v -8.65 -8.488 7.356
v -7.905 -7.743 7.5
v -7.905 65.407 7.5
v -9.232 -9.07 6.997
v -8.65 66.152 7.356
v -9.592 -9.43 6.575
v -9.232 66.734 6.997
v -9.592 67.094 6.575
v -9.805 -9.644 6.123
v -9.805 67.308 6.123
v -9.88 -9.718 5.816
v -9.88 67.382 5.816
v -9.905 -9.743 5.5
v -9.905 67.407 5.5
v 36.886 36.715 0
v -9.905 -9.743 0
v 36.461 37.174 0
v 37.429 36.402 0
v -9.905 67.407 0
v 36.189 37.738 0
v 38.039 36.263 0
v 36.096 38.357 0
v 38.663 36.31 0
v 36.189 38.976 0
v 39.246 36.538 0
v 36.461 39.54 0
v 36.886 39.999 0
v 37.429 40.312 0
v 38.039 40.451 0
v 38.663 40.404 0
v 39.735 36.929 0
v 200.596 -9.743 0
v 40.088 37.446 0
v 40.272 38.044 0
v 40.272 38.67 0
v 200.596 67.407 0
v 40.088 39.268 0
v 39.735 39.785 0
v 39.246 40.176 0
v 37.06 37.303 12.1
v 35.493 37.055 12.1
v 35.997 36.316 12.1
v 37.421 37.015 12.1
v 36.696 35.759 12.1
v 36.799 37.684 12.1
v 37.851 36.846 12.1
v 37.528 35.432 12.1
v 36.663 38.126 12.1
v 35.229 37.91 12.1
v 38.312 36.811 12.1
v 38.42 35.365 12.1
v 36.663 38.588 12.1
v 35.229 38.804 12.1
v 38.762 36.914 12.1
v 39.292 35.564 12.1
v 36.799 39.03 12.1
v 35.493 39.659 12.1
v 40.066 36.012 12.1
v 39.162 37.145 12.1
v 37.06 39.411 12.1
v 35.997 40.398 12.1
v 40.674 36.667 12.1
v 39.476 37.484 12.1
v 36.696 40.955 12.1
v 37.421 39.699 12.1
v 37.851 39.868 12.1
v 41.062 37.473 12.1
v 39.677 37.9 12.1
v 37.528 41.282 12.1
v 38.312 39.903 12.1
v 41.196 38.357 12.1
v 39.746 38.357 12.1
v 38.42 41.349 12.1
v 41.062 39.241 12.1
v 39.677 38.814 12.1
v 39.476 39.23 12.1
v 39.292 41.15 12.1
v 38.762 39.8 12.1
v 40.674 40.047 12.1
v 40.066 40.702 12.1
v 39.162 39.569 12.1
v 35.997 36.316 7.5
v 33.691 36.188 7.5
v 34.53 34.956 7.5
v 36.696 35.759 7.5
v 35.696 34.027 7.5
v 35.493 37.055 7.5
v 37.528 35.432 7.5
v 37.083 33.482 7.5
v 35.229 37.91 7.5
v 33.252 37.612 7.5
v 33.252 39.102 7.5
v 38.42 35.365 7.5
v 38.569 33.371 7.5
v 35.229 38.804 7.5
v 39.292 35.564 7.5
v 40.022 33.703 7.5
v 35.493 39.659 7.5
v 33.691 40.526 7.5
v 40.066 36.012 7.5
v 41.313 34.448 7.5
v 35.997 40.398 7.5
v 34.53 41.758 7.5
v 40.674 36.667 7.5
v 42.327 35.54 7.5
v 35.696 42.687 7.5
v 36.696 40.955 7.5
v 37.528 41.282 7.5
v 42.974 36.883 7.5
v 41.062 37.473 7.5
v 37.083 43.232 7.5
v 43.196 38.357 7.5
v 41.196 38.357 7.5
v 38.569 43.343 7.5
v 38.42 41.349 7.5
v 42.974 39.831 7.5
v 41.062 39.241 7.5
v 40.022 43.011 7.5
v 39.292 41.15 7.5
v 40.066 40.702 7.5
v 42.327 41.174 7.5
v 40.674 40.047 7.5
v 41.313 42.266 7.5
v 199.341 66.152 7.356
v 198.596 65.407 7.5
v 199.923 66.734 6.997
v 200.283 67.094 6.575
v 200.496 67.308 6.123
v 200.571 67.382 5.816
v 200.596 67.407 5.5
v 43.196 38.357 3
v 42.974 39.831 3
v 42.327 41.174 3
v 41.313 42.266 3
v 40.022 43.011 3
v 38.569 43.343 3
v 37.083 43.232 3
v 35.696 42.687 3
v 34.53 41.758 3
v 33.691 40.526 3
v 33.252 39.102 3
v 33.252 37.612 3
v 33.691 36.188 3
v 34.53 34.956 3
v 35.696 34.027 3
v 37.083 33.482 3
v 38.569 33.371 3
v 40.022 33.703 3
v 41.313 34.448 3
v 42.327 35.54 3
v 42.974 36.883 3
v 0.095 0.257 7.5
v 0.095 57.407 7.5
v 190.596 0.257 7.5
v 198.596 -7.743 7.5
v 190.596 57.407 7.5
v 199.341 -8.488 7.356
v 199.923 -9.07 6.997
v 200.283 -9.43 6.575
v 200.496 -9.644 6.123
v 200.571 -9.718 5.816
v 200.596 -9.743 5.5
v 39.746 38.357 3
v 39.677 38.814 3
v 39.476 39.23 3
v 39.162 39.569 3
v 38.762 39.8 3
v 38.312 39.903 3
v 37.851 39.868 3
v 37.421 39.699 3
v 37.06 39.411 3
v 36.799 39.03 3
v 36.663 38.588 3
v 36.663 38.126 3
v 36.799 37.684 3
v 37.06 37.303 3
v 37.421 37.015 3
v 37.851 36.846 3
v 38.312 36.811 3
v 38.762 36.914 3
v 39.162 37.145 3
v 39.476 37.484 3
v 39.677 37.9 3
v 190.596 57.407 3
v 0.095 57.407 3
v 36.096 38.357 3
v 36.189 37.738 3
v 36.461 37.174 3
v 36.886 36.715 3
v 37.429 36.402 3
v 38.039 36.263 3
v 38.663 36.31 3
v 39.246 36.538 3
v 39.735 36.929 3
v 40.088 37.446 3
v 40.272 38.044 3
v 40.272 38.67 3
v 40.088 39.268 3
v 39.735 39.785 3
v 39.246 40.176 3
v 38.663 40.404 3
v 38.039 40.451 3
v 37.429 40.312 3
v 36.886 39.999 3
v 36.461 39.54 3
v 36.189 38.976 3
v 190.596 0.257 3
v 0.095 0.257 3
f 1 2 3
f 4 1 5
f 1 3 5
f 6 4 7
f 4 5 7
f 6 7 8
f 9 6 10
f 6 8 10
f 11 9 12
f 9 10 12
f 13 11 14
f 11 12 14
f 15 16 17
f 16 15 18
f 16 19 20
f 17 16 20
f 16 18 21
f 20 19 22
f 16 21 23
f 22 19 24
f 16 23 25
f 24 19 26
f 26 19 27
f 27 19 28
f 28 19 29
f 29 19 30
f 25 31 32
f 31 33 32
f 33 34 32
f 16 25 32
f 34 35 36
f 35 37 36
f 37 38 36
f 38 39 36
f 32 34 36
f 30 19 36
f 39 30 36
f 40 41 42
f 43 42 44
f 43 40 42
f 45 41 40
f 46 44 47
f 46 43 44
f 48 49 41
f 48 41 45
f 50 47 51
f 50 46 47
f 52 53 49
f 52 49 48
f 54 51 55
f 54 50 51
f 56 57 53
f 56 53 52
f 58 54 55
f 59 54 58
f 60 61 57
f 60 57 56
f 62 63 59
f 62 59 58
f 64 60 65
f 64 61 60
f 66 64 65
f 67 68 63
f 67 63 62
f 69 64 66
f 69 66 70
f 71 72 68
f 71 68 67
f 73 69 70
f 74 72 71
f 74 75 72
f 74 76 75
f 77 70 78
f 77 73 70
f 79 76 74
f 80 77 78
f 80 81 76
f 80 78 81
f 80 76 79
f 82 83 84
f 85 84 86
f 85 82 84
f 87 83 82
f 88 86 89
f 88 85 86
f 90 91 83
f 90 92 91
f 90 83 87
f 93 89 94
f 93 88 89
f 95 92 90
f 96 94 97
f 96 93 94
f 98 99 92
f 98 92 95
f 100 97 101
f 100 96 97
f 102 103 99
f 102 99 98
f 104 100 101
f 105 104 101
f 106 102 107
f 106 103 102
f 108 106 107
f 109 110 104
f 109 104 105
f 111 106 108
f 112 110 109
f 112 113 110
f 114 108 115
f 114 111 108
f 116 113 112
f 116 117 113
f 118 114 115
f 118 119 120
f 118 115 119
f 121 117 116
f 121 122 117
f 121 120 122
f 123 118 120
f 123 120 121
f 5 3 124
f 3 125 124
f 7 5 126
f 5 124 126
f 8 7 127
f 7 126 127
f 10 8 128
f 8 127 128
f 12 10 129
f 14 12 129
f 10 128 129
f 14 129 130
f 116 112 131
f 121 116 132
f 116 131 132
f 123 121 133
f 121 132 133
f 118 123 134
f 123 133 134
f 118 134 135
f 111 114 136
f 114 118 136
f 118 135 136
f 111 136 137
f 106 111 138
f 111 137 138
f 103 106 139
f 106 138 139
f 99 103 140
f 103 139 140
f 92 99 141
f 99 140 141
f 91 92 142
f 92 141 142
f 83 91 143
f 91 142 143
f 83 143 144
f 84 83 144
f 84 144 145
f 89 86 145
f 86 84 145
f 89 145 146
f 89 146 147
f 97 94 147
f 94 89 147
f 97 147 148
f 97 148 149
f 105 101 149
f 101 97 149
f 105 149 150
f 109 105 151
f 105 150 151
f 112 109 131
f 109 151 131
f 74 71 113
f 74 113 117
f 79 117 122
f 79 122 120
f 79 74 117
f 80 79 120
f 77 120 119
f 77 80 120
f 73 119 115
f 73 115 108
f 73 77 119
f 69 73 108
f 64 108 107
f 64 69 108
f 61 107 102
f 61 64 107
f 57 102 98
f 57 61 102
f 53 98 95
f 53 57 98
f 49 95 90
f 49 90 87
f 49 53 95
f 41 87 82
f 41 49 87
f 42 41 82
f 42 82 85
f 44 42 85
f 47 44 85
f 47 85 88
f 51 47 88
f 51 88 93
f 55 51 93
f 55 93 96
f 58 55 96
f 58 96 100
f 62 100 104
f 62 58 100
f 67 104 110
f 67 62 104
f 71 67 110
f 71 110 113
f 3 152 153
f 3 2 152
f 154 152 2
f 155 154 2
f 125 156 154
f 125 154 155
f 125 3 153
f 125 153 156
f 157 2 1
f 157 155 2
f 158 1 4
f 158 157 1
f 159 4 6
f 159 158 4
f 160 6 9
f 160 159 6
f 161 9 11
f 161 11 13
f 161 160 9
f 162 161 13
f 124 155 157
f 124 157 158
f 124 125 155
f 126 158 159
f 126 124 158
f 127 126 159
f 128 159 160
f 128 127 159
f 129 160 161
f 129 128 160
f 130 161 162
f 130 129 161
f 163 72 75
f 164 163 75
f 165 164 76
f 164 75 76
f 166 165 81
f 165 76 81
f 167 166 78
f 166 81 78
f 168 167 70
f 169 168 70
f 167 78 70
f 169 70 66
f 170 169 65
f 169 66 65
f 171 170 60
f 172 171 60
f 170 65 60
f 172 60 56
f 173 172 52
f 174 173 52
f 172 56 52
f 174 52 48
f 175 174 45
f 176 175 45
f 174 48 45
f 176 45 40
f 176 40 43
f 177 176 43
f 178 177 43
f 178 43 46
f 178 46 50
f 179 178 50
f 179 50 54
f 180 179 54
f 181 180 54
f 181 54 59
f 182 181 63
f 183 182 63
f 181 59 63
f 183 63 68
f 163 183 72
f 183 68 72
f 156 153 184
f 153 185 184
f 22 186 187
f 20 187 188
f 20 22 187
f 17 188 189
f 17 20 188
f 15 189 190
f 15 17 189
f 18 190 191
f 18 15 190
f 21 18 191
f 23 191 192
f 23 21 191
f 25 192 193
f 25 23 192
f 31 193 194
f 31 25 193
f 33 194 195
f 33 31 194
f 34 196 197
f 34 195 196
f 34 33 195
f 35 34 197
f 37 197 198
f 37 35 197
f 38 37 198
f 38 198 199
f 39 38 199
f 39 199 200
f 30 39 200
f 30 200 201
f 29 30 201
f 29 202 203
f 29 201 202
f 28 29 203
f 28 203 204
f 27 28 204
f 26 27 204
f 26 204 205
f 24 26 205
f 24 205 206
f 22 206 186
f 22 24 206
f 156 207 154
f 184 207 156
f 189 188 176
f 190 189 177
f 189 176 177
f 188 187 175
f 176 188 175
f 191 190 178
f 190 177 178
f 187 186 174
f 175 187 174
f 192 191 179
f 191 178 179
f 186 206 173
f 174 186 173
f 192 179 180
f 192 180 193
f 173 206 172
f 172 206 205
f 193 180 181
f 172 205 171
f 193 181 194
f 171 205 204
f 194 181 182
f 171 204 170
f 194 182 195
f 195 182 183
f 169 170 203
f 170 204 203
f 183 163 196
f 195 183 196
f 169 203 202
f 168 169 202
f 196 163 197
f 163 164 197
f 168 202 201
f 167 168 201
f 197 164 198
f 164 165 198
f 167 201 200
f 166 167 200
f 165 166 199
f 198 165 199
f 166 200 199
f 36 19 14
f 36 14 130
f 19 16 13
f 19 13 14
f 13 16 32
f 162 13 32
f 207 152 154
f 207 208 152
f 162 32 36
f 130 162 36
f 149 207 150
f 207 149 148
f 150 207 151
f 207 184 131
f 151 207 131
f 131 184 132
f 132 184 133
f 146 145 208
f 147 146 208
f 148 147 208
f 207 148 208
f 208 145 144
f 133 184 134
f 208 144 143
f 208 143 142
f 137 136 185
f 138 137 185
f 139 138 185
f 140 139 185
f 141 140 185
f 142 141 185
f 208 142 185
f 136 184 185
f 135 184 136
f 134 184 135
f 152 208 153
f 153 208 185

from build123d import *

# Parameters (mm, degrees)
SKETCH_2_W                 = 210.5009
SKETCH_2_H                 = 77.1505
EXTRUDE_1_DEPTH            = 34.5
SHELL_1_T                  = -10
SHELL_1_THICKNESS_2_FACE_W = 190.5009
SHELL_1_THICKNESS_2_FACE_H = 57.1505
SHELL_1_THICKNESS_2_DEPTH  = 7
SKETCH_3_R                 = 2.1
CUT_EXTRUDE_8_DEPTH        = 7.6
SKETCH_4_R                 = 5
EXTRUDE_2_DEPTH            = 9.1
SKETCH_6_R                 = 1.55
CUT_EXTRUDE_9_DEPTH        = 9.1
CUT_EXTRUDE_START          = 12.1
SKETCH_10_OUTSIDE_W        = 257.867
SKETCH_10_OUTSIDE_H        = 124.516
SKETCH_10_OUTSIDE_R        = 3
CUT_EXTRUDE_16_DEPTH       = 4.6
FILLET_1_R                 = 2


with BuildPart() as part:
    # 草图2 → 凸台-拉伸1 (new body)
    with BuildSketch(Plane.XY):
        with Locations((95.3455423, 28.832065)):
            Rectangle(SKETCH_2_W, SKETCH_2_H)
    extrude(amount=EXTRUDE_1_DEPTH)

    # 抽壳1
    shell_1_openings = [part.faces().sort_by_distance(p)[0] for p in [
        (95.3455423, 28.832065, 34.5),
    ]]
    offset(amount=SHELL_1_T, openings=shell_1_openings, kind=Kind.INTERSECTION)

    # 抽壳1 thickness 2 face (on inner face of the shell) → 抽壳1 thickness 2 (cut)
    with BuildSketch(Plane(origin=(95.3455423, 28.832065, 10), x_dir=(-1, 0, 0), z_dir=(0, 0, -1))):
        Rectangle(SHELL_1_THICKNESS_2_FACE_W, SHELL_1_THICKNESS_2_FACE_H)
    extrude(amount=SHELL_1_THICKNESS_2_DEPTH, mode=Mode.SUBTRACT)

    # 草图3 → 切除-拉伸8 (cut)
    with BuildSketch(Plane.XY):
        with Locations(Location((38.19575, 38.357, 0), (0, 0, 180))):
            Circle(SKETCH_3_R)
    extrude(amount=CUT_EXTRUDE_8_DEPTH, mode=Mode.SUBTRACT)

    # 草图4 → 凸台-拉伸2 (add)
    with BuildSketch(Plane.XY.offset(3)):
        with Locations((38.19575, 38.357)):
            Circle(SKETCH_4_R)
    extrude(amount=EXTRUDE_2_DEPTH)

    # 草图6 → 切除-拉伸9 (cut)
    with BuildSketch(Plane.XY.offset(12.1)):
        with Locations((38.19575, 38.357)):
            Circle(SKETCH_6_R)
    extrude(amount=-CUT_EXTRUDE_9_DEPTH, mode=Mode.SUBTRACT)

    # 草图10 outside → 切除-拉伸16 (cut)
    with BuildSketch(Plane.XY.offset(CUT_EXTRUDE_START)):
        with Locations((95.3455, 28.832)):
            Rectangle(SKETCH_10_OUTSIDE_W, SKETCH_10_OUTSIDE_H)
        with Locations((38.19575, 38.357)):
            Circle(SKETCH_10_OUTSIDE_R, mode=Mode.SUBTRACT)
    extrude(amount=-CUT_EXTRUDE_16_DEPTH, mode=Mode.SUBTRACT)


with BuildPart() as cut_extrude_16_kept_piece:
    # of the separate pieces the step leaves, the one the design keeps (cut_extrude_16_pieces_kept)
    add(part.part.solids().sort_by_distance((200.5959923, -9.743185, 0))[0])

    # 圆角1
    fillet_1_edges = [cut_extrude_16_kept_piece.edges().sort_by_distance(p)[0] for p in [
        (-9.9049077, 28.832065, 7.5),
        (95.3455423, -9.743185, 7.5),
        (200.5959923, 28.832065, 7.5),
        (95.3455423, 67.407315, 7.5),
    ]]
    fillet(fillet_1_edges, radius=FILLET_1_R)


solid = cut_extrude_16_kept_piece.part
